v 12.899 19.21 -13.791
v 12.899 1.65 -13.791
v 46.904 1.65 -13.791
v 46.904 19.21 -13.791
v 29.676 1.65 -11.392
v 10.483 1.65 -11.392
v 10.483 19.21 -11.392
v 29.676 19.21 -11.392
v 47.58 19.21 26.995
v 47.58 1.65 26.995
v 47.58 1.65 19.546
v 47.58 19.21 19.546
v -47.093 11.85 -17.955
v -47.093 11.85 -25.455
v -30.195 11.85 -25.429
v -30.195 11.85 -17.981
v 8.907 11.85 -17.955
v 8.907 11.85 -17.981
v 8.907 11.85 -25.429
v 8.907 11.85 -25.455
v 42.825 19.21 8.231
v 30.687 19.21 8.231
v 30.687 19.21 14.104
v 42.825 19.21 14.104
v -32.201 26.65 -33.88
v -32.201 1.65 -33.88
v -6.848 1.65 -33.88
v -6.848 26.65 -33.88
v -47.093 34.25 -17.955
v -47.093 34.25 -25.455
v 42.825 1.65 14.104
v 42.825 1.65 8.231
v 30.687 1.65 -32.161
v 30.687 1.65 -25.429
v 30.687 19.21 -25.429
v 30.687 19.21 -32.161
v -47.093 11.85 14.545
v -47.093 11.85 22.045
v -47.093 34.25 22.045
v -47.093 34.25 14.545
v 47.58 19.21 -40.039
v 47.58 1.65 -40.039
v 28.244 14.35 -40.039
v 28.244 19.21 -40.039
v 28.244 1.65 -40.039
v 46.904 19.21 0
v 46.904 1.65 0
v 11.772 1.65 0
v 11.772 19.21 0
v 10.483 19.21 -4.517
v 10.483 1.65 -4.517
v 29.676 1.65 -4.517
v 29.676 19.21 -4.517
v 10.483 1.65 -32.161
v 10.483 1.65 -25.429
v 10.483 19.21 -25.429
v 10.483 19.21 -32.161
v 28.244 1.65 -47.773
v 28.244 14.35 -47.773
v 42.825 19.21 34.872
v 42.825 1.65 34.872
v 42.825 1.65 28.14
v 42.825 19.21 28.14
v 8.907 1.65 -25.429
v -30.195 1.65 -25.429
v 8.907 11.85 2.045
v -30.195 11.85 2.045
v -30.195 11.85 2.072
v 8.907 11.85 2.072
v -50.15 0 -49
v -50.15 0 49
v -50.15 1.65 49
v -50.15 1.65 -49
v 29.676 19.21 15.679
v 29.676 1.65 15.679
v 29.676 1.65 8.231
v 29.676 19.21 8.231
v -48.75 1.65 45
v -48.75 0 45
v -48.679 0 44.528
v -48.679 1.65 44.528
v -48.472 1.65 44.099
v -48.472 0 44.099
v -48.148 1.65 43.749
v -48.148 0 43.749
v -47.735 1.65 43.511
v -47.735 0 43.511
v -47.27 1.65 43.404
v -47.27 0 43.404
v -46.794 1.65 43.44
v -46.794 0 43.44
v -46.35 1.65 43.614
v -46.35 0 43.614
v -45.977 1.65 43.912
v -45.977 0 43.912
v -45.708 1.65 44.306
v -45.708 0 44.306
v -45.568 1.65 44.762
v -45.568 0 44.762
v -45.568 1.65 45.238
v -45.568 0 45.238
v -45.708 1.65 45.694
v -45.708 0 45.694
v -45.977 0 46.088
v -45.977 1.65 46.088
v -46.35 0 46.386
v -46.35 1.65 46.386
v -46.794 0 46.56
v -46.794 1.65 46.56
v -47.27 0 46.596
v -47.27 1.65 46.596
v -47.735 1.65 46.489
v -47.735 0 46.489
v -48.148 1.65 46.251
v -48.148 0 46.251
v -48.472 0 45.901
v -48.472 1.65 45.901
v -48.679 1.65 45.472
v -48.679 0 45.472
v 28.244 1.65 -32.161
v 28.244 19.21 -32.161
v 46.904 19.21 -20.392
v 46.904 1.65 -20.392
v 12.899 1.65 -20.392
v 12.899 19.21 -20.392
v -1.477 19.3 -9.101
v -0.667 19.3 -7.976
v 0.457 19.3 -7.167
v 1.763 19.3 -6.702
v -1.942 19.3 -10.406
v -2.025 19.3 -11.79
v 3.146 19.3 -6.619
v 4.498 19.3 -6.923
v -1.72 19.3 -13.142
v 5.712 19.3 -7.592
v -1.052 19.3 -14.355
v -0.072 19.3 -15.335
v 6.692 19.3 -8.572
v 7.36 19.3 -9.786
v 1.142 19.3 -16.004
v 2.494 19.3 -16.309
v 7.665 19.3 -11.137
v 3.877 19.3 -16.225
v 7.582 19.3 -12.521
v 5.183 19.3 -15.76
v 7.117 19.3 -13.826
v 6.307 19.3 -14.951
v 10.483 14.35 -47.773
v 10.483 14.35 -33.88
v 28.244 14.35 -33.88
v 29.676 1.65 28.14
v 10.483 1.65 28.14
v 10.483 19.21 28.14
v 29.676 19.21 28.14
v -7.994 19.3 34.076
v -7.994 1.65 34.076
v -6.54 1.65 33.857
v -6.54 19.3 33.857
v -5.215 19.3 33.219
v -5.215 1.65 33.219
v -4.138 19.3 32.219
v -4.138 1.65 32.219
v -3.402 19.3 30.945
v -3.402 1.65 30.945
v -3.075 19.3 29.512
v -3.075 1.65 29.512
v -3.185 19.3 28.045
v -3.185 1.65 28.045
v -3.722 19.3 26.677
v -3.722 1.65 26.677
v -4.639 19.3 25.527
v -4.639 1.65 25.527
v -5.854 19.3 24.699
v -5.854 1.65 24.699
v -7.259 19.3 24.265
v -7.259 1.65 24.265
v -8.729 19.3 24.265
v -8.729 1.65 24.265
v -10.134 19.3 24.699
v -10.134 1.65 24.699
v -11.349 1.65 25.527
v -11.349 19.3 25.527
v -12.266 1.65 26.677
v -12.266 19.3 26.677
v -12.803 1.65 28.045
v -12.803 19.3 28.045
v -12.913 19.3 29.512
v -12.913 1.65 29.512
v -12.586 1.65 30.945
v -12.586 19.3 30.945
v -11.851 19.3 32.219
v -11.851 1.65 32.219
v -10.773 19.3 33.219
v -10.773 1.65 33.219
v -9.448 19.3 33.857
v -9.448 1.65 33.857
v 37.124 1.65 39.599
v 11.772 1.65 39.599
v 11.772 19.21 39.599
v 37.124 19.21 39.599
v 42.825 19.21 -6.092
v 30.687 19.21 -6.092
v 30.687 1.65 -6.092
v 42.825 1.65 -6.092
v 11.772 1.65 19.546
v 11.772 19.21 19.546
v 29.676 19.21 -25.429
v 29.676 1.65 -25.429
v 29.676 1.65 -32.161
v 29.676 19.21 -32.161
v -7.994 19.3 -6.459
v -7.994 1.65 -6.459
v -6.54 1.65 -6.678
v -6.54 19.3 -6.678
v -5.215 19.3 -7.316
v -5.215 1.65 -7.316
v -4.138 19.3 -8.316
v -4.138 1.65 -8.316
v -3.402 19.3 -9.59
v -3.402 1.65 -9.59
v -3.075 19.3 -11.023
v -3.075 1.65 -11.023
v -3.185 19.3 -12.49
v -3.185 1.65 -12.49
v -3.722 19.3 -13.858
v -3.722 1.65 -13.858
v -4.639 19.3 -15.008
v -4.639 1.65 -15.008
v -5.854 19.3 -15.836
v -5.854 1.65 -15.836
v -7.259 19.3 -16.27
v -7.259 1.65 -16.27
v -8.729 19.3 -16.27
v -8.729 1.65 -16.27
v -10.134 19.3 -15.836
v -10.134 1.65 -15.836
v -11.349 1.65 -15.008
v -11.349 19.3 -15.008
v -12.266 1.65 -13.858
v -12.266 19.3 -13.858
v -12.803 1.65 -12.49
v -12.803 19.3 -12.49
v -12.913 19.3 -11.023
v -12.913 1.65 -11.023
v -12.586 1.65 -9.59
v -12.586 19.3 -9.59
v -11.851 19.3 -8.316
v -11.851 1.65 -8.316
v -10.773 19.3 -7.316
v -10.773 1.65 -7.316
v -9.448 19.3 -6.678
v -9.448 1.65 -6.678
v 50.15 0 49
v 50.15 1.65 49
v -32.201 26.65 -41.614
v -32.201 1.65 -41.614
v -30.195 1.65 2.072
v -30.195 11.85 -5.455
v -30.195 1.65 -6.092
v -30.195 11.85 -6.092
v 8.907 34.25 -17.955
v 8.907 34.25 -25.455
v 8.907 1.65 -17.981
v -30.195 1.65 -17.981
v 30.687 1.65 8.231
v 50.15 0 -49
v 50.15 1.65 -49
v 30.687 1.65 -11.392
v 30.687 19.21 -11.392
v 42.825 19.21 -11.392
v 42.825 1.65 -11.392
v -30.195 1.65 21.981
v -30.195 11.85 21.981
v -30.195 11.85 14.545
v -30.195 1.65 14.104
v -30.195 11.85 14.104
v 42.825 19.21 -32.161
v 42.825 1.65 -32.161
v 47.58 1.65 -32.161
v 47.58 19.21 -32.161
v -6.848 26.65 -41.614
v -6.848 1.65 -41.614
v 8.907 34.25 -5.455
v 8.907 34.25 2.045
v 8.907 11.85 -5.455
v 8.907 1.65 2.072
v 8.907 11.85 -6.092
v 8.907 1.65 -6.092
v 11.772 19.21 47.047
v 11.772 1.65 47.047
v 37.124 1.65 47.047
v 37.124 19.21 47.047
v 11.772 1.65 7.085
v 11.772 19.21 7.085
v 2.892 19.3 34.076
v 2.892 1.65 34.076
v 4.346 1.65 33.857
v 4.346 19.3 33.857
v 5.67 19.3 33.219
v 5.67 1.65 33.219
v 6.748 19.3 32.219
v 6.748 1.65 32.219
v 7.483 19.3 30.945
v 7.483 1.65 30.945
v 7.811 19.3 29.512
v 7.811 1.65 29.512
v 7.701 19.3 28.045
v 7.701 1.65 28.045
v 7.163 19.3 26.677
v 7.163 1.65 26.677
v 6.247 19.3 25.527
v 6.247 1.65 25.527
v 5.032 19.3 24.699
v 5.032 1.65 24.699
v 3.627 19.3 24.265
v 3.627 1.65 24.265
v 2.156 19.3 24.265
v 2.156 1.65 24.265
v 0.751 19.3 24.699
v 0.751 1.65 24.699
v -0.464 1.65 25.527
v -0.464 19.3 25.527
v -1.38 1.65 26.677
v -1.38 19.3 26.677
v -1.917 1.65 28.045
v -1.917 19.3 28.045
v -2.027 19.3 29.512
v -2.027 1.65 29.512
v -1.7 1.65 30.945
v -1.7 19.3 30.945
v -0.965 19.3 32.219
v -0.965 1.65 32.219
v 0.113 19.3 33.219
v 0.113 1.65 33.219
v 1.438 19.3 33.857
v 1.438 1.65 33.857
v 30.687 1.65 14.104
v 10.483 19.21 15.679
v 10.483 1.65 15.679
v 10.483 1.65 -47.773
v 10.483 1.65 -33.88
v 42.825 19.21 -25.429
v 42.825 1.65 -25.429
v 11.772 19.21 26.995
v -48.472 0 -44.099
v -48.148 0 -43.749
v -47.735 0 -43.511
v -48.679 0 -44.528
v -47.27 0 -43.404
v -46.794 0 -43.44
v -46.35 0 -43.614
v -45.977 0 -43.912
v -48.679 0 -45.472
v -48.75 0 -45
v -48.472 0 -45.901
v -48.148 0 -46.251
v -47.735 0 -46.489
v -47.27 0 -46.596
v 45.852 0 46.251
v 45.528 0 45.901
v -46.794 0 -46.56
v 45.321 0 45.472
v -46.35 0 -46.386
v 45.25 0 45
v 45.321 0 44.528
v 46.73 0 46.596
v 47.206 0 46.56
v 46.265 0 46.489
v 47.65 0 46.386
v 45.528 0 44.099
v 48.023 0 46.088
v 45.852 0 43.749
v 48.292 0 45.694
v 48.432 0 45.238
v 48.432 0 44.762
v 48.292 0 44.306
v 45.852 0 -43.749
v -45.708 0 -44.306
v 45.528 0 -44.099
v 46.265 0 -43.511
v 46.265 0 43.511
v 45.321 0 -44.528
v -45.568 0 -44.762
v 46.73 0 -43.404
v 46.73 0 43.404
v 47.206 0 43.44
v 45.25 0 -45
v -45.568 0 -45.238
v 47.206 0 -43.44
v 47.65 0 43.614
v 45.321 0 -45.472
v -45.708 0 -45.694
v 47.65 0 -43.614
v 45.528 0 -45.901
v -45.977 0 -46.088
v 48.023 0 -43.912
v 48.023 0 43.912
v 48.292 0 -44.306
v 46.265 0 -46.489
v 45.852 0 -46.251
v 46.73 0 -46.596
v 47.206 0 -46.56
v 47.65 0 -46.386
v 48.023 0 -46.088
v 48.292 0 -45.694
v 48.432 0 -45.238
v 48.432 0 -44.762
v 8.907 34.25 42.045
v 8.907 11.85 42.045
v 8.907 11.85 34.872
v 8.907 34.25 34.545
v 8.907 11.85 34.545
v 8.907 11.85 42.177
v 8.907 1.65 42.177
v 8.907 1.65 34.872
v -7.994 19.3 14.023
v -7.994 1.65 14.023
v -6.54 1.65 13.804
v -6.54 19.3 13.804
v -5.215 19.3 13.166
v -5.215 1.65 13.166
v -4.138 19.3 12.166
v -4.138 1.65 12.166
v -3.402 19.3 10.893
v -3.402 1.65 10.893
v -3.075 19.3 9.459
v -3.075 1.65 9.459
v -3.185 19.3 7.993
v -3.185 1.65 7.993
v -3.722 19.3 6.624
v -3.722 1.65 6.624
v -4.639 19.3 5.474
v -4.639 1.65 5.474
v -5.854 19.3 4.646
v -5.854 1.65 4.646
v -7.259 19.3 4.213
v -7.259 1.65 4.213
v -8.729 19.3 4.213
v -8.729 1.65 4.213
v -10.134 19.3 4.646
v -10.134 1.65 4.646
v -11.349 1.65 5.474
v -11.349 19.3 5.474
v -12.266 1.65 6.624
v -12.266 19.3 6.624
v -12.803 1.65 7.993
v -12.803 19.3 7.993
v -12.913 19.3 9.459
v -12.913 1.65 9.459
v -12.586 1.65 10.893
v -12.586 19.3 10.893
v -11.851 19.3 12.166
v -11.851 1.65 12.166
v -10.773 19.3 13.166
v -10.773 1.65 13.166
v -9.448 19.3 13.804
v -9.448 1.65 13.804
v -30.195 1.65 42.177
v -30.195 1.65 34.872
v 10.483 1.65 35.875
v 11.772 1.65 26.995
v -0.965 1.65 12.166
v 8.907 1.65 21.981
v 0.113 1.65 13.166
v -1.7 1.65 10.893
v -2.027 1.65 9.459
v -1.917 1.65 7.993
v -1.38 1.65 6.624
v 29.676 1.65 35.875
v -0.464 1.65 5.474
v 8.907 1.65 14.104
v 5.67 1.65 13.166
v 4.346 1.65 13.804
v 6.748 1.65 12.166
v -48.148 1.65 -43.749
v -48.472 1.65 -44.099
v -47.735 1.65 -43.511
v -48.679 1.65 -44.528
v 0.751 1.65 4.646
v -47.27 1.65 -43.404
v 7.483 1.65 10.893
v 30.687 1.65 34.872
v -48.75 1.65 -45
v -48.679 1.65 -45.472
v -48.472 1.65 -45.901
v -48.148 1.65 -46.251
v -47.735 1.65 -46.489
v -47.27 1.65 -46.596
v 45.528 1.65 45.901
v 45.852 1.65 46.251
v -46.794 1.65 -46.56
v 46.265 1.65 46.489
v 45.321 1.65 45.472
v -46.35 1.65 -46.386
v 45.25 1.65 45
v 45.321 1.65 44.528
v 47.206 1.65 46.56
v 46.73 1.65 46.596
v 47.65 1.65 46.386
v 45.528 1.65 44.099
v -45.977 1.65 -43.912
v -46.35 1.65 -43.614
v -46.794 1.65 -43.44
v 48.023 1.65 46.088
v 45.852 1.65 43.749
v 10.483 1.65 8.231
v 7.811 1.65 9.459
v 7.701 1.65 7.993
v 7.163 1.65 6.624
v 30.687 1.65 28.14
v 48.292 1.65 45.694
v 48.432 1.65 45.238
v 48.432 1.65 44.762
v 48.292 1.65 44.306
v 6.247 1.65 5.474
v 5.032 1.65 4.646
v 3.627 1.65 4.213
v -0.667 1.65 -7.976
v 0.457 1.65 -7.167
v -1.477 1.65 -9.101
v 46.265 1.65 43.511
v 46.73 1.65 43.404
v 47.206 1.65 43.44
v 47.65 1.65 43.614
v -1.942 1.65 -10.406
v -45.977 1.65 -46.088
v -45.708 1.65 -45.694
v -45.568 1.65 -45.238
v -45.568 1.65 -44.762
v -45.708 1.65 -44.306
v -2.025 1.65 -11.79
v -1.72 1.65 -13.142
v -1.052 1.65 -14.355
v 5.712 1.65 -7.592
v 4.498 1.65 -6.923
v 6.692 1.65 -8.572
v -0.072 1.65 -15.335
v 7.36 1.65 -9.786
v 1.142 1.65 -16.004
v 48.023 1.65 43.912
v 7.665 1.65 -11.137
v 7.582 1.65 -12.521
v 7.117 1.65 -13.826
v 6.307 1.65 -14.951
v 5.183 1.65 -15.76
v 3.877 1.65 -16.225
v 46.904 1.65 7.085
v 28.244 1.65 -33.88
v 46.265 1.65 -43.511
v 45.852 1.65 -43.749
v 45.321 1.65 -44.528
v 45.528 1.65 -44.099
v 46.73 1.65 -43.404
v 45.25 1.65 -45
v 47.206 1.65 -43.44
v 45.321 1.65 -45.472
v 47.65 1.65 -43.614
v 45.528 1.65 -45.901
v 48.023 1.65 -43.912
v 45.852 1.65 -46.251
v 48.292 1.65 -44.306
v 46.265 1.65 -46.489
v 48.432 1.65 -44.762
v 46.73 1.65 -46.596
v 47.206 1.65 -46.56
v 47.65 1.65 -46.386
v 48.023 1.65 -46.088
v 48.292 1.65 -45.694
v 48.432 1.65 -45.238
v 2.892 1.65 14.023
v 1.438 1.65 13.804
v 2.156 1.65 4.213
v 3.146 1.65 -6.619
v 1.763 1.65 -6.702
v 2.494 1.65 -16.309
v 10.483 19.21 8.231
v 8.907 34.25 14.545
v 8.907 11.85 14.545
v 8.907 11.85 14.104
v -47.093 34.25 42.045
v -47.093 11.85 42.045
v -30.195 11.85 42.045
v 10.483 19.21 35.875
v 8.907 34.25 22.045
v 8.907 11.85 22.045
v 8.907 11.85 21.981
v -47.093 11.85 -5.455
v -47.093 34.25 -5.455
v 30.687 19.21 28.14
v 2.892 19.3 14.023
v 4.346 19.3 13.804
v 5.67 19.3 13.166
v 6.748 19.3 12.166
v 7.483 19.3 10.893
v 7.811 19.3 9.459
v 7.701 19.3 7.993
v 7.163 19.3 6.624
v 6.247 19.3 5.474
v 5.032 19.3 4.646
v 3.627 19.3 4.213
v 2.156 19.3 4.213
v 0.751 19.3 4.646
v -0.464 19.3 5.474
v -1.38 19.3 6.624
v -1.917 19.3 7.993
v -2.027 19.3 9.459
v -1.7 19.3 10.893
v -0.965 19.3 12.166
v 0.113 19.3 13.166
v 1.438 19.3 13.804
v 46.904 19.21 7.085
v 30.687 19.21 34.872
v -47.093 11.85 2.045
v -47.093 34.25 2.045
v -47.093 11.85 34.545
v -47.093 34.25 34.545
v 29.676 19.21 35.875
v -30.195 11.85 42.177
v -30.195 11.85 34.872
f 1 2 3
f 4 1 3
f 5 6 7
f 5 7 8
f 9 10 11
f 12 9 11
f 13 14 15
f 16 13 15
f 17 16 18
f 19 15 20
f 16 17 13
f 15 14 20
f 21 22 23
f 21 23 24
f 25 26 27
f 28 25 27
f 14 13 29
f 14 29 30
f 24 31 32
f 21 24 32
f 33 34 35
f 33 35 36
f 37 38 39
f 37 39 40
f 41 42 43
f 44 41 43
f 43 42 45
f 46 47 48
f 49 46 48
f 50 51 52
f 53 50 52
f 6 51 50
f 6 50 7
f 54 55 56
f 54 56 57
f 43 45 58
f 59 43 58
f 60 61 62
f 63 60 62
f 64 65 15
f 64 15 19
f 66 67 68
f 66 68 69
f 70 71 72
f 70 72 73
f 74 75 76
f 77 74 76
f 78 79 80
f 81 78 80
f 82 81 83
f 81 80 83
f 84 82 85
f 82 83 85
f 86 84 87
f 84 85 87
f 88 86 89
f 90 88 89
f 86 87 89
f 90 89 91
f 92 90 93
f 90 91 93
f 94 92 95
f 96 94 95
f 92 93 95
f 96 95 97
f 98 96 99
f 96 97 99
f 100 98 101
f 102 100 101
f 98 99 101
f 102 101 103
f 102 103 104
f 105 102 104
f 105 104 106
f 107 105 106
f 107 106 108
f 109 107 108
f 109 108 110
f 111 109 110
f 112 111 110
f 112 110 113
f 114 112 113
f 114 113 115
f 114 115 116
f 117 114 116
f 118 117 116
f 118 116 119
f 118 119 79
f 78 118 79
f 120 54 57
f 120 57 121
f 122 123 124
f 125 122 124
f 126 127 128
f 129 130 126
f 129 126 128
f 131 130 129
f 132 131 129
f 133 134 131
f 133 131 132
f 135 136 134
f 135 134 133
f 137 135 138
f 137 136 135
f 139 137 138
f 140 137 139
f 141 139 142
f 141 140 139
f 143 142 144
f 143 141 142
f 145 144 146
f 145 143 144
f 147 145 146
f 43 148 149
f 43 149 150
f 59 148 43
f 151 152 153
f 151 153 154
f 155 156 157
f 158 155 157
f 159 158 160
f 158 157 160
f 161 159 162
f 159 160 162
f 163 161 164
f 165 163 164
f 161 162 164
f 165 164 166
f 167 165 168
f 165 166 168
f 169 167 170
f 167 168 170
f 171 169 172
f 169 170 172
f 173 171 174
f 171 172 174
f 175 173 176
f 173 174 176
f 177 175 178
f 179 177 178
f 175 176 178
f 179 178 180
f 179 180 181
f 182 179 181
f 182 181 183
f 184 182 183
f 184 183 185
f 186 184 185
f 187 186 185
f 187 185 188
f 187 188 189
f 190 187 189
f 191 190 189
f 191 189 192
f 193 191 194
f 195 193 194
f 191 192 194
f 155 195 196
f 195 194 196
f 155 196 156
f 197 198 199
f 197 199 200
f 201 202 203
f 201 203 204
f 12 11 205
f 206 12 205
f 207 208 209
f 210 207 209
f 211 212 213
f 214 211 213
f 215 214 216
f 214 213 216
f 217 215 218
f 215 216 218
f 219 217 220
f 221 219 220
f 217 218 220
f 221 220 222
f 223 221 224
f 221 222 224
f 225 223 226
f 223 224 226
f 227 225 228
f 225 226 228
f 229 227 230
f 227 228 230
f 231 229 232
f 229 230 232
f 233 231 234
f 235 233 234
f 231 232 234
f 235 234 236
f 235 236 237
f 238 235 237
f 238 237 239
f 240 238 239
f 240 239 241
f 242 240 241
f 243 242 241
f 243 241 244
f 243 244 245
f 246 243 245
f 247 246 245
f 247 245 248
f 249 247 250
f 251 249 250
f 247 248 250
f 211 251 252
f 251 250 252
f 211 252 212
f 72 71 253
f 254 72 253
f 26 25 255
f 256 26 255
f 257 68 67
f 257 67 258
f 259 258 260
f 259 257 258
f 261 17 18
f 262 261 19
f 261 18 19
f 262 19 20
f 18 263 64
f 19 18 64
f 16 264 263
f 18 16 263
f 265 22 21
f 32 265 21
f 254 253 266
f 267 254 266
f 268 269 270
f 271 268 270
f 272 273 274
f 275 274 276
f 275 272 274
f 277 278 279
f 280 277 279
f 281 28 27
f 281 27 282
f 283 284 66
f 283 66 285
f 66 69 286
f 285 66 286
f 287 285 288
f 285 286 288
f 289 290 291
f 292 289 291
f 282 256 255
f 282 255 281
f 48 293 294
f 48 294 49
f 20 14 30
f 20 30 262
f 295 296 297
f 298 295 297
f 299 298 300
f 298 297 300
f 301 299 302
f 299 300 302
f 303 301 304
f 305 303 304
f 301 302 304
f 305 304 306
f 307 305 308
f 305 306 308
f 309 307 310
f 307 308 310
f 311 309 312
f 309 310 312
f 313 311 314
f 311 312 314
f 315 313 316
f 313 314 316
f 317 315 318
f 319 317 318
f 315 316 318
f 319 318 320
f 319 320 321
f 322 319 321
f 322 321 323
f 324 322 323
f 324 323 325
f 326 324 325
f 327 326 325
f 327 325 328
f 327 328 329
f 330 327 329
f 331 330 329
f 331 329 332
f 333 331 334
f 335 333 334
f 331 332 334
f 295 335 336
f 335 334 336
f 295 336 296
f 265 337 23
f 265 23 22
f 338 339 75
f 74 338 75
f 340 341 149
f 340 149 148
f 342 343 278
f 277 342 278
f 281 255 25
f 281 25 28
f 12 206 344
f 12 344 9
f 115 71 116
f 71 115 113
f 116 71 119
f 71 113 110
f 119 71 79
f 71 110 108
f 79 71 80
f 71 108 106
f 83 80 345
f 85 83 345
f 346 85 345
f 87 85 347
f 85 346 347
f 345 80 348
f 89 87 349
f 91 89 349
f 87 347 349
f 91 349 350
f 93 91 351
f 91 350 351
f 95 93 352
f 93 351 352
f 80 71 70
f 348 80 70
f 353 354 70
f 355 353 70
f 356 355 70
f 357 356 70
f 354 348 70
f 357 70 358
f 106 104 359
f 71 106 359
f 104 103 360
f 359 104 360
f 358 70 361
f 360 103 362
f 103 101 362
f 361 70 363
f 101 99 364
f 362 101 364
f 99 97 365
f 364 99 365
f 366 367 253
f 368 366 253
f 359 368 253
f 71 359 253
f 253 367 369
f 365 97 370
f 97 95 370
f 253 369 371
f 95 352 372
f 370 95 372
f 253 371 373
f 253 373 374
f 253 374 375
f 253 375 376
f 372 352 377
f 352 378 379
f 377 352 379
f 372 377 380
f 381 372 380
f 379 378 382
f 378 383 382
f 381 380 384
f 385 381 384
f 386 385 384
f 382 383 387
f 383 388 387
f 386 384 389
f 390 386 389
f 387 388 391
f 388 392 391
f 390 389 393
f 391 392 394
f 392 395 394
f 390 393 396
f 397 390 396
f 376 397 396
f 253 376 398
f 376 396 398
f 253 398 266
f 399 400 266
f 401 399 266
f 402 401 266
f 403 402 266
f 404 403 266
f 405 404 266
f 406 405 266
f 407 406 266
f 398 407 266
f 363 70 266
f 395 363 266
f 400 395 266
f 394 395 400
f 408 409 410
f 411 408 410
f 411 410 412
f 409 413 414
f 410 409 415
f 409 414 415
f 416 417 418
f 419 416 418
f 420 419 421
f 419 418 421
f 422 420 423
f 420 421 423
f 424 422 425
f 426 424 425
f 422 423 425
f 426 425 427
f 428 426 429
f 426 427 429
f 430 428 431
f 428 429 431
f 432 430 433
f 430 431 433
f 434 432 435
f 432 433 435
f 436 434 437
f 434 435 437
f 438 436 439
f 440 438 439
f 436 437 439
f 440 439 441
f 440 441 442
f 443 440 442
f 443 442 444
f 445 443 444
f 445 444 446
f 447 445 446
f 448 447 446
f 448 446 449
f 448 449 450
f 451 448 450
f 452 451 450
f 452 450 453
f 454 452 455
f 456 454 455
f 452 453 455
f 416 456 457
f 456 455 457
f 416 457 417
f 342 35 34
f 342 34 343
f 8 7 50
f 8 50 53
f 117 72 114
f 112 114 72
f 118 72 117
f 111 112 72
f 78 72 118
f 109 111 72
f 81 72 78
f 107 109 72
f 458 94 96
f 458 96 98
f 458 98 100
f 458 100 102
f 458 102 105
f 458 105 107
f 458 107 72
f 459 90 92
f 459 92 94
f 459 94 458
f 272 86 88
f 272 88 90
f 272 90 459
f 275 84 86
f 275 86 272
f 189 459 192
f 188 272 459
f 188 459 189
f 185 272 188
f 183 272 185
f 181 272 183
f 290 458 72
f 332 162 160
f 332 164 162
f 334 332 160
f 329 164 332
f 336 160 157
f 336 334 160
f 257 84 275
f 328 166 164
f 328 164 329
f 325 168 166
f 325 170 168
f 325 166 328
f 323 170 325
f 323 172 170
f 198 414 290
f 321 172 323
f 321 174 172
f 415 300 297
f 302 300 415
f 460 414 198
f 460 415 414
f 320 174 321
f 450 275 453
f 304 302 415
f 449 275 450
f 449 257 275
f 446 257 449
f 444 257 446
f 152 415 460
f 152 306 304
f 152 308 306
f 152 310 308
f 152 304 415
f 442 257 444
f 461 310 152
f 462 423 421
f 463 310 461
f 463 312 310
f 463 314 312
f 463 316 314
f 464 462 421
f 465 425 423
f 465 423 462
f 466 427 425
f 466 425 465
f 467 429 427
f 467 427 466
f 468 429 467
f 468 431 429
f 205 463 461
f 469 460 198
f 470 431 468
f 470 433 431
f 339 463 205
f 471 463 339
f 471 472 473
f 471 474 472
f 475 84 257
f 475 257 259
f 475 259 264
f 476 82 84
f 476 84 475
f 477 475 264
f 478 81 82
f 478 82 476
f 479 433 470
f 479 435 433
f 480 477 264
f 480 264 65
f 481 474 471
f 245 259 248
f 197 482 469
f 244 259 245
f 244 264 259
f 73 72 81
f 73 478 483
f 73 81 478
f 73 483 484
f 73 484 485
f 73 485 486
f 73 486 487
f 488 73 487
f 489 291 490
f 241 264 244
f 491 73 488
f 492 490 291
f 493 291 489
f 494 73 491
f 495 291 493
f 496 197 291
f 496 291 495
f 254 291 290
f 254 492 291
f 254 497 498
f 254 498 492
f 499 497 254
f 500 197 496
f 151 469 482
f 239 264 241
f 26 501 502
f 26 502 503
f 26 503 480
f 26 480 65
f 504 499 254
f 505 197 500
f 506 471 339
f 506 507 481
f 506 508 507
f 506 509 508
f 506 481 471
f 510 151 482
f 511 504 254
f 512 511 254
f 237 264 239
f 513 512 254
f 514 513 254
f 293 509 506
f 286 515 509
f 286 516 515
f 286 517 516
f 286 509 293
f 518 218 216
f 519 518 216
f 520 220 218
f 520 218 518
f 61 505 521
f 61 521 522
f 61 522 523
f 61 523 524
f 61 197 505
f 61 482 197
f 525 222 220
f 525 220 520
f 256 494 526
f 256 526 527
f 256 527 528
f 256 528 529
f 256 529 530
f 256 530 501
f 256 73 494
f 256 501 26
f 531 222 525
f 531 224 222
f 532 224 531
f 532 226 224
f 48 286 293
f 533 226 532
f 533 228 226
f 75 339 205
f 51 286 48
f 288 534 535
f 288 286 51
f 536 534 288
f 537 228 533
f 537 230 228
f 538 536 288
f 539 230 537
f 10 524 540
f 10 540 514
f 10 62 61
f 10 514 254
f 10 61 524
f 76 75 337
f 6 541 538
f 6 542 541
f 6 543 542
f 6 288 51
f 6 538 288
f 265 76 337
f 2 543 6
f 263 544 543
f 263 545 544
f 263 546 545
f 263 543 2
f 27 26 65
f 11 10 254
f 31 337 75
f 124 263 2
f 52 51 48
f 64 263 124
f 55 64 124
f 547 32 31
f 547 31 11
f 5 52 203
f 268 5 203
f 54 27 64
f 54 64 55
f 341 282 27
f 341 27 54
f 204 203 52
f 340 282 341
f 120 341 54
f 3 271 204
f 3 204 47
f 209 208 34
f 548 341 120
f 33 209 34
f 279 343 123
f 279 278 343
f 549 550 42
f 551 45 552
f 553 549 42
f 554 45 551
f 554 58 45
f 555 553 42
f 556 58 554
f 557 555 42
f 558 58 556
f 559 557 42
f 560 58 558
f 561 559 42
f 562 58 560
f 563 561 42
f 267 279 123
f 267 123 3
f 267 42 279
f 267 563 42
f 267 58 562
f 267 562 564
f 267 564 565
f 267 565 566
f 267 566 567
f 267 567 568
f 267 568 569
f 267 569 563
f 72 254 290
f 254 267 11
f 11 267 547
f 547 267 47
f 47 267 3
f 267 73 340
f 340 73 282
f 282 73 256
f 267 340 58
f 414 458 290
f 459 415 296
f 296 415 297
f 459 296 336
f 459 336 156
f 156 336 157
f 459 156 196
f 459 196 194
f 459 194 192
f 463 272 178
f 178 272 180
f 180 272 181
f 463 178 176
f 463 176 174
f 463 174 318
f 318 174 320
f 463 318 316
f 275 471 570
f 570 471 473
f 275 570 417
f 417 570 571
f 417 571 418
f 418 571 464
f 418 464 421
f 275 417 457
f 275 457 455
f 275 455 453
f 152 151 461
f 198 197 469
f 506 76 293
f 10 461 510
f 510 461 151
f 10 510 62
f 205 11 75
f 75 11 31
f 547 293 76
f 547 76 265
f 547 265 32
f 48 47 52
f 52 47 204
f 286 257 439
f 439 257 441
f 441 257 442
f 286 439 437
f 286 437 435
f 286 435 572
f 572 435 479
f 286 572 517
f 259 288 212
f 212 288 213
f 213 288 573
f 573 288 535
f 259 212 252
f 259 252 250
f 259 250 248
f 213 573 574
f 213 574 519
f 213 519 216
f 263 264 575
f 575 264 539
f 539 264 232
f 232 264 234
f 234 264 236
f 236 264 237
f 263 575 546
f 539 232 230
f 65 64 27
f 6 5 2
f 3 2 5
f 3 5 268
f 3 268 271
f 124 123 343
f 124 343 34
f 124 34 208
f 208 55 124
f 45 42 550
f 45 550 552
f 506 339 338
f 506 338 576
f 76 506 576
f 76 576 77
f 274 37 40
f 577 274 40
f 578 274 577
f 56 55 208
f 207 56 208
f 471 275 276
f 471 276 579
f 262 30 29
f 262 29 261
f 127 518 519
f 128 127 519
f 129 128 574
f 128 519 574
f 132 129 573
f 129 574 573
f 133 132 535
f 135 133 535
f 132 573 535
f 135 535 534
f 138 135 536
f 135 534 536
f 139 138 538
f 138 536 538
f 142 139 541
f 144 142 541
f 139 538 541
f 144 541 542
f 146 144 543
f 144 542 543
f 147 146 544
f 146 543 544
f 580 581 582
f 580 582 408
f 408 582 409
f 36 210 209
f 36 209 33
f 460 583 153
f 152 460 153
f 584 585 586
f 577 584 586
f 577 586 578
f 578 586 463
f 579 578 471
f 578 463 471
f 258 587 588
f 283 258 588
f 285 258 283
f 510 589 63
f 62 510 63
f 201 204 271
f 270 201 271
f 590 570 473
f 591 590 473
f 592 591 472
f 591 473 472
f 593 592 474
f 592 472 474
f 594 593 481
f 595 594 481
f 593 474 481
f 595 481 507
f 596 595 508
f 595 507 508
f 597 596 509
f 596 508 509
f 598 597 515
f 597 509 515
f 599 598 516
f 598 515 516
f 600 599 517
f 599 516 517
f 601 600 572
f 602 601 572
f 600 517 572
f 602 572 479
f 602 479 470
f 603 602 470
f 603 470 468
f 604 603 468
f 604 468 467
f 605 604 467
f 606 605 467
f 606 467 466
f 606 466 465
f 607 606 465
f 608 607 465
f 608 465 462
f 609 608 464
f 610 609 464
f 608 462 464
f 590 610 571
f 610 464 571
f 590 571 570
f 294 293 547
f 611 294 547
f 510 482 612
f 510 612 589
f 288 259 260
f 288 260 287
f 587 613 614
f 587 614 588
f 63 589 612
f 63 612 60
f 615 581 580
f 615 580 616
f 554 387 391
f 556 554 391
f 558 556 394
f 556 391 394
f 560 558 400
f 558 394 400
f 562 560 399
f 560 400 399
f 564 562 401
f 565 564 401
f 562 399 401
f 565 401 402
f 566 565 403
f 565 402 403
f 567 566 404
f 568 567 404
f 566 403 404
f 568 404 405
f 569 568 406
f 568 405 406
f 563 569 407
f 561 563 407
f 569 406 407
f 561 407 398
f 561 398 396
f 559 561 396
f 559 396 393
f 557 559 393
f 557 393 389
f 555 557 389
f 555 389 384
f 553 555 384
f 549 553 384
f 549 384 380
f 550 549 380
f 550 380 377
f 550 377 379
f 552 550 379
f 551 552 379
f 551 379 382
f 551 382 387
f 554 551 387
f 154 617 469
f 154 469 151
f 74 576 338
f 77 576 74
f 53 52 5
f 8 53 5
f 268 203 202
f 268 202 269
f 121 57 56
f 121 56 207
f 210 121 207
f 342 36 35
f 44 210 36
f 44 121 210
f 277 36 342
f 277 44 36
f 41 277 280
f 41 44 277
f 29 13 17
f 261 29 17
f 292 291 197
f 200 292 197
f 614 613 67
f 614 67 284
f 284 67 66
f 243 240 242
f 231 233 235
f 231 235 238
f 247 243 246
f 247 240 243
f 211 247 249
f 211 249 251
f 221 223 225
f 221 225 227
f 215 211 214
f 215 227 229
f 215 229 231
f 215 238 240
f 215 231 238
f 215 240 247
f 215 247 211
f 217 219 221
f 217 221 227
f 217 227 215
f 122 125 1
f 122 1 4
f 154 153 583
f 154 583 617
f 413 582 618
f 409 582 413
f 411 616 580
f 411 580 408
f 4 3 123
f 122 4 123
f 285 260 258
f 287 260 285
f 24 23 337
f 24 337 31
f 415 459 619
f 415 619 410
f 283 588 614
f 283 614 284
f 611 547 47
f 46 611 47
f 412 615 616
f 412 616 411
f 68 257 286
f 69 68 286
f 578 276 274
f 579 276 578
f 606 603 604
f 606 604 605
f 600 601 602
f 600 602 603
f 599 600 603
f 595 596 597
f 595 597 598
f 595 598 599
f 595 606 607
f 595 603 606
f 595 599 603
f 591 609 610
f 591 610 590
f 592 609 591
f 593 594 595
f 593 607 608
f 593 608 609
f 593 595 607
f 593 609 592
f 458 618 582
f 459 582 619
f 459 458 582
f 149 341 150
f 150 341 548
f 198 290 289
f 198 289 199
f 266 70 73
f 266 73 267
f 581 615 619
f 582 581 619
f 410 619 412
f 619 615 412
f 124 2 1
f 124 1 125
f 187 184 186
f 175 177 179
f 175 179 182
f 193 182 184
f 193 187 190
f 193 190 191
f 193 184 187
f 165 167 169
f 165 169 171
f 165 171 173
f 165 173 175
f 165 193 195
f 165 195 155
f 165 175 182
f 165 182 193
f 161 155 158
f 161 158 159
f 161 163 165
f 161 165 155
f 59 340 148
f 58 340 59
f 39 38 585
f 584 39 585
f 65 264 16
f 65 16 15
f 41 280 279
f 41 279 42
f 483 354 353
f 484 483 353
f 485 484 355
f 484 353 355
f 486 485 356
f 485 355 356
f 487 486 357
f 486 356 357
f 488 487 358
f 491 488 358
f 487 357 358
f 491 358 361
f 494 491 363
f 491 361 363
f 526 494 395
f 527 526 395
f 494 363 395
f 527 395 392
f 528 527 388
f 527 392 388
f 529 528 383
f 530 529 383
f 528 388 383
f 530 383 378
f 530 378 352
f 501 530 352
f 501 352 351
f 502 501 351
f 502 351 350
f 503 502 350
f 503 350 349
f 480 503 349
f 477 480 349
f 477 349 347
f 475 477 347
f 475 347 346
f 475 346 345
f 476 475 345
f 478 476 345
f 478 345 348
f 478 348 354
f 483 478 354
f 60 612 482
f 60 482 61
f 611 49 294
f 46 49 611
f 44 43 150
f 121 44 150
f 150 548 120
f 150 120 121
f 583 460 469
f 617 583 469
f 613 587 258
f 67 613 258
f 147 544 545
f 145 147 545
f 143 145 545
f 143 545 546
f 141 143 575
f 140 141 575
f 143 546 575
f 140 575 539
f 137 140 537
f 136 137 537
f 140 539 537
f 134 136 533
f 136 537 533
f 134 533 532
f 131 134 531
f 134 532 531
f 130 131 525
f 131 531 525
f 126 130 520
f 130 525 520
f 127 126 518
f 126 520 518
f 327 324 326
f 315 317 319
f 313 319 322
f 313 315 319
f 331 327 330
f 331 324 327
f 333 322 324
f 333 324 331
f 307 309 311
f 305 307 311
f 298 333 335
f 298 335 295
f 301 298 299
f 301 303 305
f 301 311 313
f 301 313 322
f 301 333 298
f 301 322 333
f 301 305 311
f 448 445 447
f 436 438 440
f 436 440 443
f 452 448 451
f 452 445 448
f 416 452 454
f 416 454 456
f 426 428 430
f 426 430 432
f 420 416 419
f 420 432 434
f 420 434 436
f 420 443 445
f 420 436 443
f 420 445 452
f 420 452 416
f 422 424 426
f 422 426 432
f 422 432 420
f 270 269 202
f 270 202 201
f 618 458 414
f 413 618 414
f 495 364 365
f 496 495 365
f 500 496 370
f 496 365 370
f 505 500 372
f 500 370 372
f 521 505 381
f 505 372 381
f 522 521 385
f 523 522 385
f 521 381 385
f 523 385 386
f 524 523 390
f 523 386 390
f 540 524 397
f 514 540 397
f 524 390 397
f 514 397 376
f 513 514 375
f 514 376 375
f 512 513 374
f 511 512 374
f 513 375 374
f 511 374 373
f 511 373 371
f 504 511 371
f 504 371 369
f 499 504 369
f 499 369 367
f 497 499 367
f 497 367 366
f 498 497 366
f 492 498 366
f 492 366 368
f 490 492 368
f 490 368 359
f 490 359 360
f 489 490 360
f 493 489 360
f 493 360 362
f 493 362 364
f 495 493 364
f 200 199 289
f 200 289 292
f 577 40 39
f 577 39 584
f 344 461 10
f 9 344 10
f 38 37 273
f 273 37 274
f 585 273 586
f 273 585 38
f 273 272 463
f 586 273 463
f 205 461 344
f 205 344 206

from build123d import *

# Parameters (mm, degrees)
SKETCH2_W            = 100.3
SKETCH2_H            = 98
BOSS_EXTRUDE1_DEPTH  = 1.65
SKETCH5_W            = 39.102680246
SKETCH5_H            = 7.304896309
SKETCH5_H_2          = 7.877829353
SKETCH5_H_3          = 8.164295876
SKETCH5_H_4          = 7.448129571
BOSS_EXTRUDE4_DEPTH  = 10.2
SKETCH5_3_R          = 4.932717276
BOSS_EXTRUDE5_DEPTH  = 17.65
M3_CLEARANCE_HOLE1_D = 3.2
SKETCH6_W            = 56
SKETCH6_H            = 7.5
BOSS_EXTRUDE6_DEPTH  = 22.4
LPATTERN1_COUNT      = 4
LPATTERN1_PITCH      = 20
SKETCH5_4_W          = 25.352287192
SKETCH5_4_H          = 7.44812957
SKETCH5_4_W_2        = 19.193256971
SKETCH5_4_H_2        = 7.734596093
SKETCH5_4_W_3        = 35.808315243
SKETCH5_4_W_4        = 35.131761676
SKETCH5_4_H_3        = 7.085146118
SKETCH5_4_H_4        = 6.875196527
SKETCH5_4_W_5        = 34.004867694
SKETCH5_4_H_5        = 6.601011751
SKETCH5_4_W_6        = 12.138008325
SKETCH5_4_H_6        = 5.299630656
SKETCH5_4_H_7        = 5.8725637
SKETCH5_4_H_8        = 6.731963266
BOSS_EXTRUDE11_DEPTH = 17.56
SKETCH5_6_W          = 17.760924361
SKETCH5_6_H          = 13.893626315
BOSS_EXTRUDE13_DEPTH = 12.7
SKETCH5_7_W          = 25.352287192
SKETCH5_7_H          = 7.734596093
BOSS_EXTRUDE14_DEPTH = 25


with BuildPart() as part:
    # Sketch2 → Boss-Extrude1 (new body)
    with BuildSketch(Plane(origin=(0, 0, 0), x_dir=(1, 0, 0), z_dir=(0, 1, 0))):
        Rectangle(SKETCH2_W, SKETCH2_H)
    extrude(amount=BOSS_EXTRUDE1_DEPTH)

    # Sketch5 → Boss-Extrude4 (add)
    with BuildSketch(Plane(origin=(0, 1.65, 0), x_dir=(1, 0, 0), z_dir=(0, 1, 0))):
        with Locations((-10.643944628, -38.524846902)):
            Rectangle(SKETCH5_W, SKETCH5_H)
        with Locations((-10.643944628, -18.042490583)):
            Rectangle(SKETCH5_W, SKETCH5_H_2)
        with Locations((-10.643944628, 2.010165954)):
            Rectangle(SKETCH5_W, SKETCH5_H_3)
        with Locations((-10.643944628, 21.704739338)):
            Rectangle(SKETCH5_W, SKETCH5_H_4)
    extrude(amount=BOSS_EXTRUDE4_DEPTH)

    # Sketch5<3> → Boss-Extrude5 (add)
    with BuildSketch(Plane(origin=(0, 1.65, 0), x_dir=(1, 0, 0), z_dir=(0, 1, 0))):
        with Locations((-7.9941293, 11.391944548)):
            Circle(SKETCH5_3_R)
        with BuildLine():
            ThreePointArc((-0.667240619, 7.976338656), (6.236323108, 8.047219973), (6.307204425, 14.9507837))
            ThreePointArc((6.307204425, 14.9507837), (-0.596359302, 14.879902383), (-0.667240619, 7.976338656))
        make_face()
        with Locations((-7.9941293, -9.090411772)):
            Circle(SKETCH5_3_R)
        with Locations((2.891598534, -9.090411772)):
            Circle(SKETCH5_3_R)
        with Locations((-7.9941293, -29.143068308)):
            Circle(SKETCH5_3_R)
        with Locations((2.891598534, -29.143068308)):
            Circle(SKETCH5_3_R)
    extrude(amount=BOSS_EXTRUDE5_DEPTH)

    # M3 Clearance Hole1 (through all)
    with Locations(Plane(origin=(0, 1.65, 0), x_dir=(1, 0, 0), z_dir=(0, 1, 0))):
        with Locations((46.85, -45), (46.85, 45), (-47.15, 45), (-47.15, -45)):
            Hole(M3_CLEARANCE_HOLE1_D / 2)

    # Sketch6 → Boss-Extrude6 (add)
    with BuildSketch(Plane(origin=(0, 11.85, 0), x_dir=(1, 0, 0), z_dir=(0, 1, 0))):
        with Locations((-19.092604505, 21.704739338)):
            Rectangle(SKETCH6_W, SKETCH6_H)
    boss_extrude6 = extrude(amount=BOSS_EXTRUDE6_DEPTH)

    # LPattern1: Boss-Extrude6 ×4
    with Locations(*[(0, 0, i * LPATTERN1_PITCH) for i in range(1, LPATTERN1_COUNT)]):
        add(boss_extrude6)

    # Sketch5<4> → Boss-Extrude11 (add)
    with BuildSketch(Plane(origin=(0, 1.65, 0), x_dir=(1, 0, 0), z_dir=(0, 1, 0))):
        with Locations((24.44820431, -43.323161144)):
            Rectangle(SKETCH5_4_W, SKETCH5_4_H)
        with Locations((20.07958985, -32.007733528)):
            Rectangle(SKETCH5_4_W_2, SKETCH5_4_H_2)
        with Locations((29.676218335, -23.270504608)):
            Rectangle(SKETCH5_4_W_3, SKETCH5_4_H)
        with Locations((29.337941552, -3.542573059)):
            Rectangle(SKETCH5_4_W_4, SKETCH5_4_H_3)
        with Locations((20.07958985, 7.954346285)):
            Rectangle(SKETCH5_4_W_2, SKETCH5_4_H_4)
        Polygon((28.243885726, 32.160767389), (10.482961365, 32.160767389), (10.482961365, 25.428804123), (29.676218336, 25.428804123), (29.676218336, 32.160767389), (30.687443267, 32.160767389), (30.687443267, 25.428804123), (42.825451592, 25.428804123), (42.825451592, 32.160767389), (47.580375957, 32.160767389), (47.580375957, 40.038596742), (28.243885726, 40.038596742), align=None)
        with Locations((29.901388543, 17.0913323)):
            Rectangle(SKETCH5_4_W_5, SKETCH5_4_H_5)
        with Locations((20.07958985, -11.955076991)):
            Rectangle(SKETCH5_4_W_2, SKETCH5_4_H)
        with Locations((36.756447429, 8.74212922)):
            Rectangle(SKETCH5_4_W_6, SKETCH5_4_H_6)
        with Locations((36.756447429, -11.167294056)):
            Rectangle(SKETCH5_4_W_6, SKETCH5_4_H_7)
        with Locations((36.756447429, -31.506417114)):
            Rectangle(SKETCH5_4_W_6, SKETCH5_4_H_8)
    extrude(amount=BOSS_EXTRUDE11_DEPTH)

    # Sketch5<6> → Boss-Extrude13 (add)
    with BuildSketch(Plane(origin=(0, 1.65, 0), x_dir=(1, 0, 0), z_dir=(0, 1, 0))):
        with Locations((19.363423546, 40.826379678)):
            Rectangle(SKETCH5_6_W, SKETCH5_6_H)
    extrude(amount=BOSS_EXTRUDE13_DEPTH)

    # Sketch5<7> → Boss-Extrude14 (add)
    with BuildSketch(Plane(origin=(0, 1.65, 0), x_dir=(1, 0, 0), z_dir=(0, 1, 0))):
        with Locations((-19.524406809, 37.746864567)):
            Rectangle(SKETCH5_7_W, SKETCH5_7_H)
    extrude(amount=BOSS_EXTRUDE14_DEPTH)


solid = part.part
